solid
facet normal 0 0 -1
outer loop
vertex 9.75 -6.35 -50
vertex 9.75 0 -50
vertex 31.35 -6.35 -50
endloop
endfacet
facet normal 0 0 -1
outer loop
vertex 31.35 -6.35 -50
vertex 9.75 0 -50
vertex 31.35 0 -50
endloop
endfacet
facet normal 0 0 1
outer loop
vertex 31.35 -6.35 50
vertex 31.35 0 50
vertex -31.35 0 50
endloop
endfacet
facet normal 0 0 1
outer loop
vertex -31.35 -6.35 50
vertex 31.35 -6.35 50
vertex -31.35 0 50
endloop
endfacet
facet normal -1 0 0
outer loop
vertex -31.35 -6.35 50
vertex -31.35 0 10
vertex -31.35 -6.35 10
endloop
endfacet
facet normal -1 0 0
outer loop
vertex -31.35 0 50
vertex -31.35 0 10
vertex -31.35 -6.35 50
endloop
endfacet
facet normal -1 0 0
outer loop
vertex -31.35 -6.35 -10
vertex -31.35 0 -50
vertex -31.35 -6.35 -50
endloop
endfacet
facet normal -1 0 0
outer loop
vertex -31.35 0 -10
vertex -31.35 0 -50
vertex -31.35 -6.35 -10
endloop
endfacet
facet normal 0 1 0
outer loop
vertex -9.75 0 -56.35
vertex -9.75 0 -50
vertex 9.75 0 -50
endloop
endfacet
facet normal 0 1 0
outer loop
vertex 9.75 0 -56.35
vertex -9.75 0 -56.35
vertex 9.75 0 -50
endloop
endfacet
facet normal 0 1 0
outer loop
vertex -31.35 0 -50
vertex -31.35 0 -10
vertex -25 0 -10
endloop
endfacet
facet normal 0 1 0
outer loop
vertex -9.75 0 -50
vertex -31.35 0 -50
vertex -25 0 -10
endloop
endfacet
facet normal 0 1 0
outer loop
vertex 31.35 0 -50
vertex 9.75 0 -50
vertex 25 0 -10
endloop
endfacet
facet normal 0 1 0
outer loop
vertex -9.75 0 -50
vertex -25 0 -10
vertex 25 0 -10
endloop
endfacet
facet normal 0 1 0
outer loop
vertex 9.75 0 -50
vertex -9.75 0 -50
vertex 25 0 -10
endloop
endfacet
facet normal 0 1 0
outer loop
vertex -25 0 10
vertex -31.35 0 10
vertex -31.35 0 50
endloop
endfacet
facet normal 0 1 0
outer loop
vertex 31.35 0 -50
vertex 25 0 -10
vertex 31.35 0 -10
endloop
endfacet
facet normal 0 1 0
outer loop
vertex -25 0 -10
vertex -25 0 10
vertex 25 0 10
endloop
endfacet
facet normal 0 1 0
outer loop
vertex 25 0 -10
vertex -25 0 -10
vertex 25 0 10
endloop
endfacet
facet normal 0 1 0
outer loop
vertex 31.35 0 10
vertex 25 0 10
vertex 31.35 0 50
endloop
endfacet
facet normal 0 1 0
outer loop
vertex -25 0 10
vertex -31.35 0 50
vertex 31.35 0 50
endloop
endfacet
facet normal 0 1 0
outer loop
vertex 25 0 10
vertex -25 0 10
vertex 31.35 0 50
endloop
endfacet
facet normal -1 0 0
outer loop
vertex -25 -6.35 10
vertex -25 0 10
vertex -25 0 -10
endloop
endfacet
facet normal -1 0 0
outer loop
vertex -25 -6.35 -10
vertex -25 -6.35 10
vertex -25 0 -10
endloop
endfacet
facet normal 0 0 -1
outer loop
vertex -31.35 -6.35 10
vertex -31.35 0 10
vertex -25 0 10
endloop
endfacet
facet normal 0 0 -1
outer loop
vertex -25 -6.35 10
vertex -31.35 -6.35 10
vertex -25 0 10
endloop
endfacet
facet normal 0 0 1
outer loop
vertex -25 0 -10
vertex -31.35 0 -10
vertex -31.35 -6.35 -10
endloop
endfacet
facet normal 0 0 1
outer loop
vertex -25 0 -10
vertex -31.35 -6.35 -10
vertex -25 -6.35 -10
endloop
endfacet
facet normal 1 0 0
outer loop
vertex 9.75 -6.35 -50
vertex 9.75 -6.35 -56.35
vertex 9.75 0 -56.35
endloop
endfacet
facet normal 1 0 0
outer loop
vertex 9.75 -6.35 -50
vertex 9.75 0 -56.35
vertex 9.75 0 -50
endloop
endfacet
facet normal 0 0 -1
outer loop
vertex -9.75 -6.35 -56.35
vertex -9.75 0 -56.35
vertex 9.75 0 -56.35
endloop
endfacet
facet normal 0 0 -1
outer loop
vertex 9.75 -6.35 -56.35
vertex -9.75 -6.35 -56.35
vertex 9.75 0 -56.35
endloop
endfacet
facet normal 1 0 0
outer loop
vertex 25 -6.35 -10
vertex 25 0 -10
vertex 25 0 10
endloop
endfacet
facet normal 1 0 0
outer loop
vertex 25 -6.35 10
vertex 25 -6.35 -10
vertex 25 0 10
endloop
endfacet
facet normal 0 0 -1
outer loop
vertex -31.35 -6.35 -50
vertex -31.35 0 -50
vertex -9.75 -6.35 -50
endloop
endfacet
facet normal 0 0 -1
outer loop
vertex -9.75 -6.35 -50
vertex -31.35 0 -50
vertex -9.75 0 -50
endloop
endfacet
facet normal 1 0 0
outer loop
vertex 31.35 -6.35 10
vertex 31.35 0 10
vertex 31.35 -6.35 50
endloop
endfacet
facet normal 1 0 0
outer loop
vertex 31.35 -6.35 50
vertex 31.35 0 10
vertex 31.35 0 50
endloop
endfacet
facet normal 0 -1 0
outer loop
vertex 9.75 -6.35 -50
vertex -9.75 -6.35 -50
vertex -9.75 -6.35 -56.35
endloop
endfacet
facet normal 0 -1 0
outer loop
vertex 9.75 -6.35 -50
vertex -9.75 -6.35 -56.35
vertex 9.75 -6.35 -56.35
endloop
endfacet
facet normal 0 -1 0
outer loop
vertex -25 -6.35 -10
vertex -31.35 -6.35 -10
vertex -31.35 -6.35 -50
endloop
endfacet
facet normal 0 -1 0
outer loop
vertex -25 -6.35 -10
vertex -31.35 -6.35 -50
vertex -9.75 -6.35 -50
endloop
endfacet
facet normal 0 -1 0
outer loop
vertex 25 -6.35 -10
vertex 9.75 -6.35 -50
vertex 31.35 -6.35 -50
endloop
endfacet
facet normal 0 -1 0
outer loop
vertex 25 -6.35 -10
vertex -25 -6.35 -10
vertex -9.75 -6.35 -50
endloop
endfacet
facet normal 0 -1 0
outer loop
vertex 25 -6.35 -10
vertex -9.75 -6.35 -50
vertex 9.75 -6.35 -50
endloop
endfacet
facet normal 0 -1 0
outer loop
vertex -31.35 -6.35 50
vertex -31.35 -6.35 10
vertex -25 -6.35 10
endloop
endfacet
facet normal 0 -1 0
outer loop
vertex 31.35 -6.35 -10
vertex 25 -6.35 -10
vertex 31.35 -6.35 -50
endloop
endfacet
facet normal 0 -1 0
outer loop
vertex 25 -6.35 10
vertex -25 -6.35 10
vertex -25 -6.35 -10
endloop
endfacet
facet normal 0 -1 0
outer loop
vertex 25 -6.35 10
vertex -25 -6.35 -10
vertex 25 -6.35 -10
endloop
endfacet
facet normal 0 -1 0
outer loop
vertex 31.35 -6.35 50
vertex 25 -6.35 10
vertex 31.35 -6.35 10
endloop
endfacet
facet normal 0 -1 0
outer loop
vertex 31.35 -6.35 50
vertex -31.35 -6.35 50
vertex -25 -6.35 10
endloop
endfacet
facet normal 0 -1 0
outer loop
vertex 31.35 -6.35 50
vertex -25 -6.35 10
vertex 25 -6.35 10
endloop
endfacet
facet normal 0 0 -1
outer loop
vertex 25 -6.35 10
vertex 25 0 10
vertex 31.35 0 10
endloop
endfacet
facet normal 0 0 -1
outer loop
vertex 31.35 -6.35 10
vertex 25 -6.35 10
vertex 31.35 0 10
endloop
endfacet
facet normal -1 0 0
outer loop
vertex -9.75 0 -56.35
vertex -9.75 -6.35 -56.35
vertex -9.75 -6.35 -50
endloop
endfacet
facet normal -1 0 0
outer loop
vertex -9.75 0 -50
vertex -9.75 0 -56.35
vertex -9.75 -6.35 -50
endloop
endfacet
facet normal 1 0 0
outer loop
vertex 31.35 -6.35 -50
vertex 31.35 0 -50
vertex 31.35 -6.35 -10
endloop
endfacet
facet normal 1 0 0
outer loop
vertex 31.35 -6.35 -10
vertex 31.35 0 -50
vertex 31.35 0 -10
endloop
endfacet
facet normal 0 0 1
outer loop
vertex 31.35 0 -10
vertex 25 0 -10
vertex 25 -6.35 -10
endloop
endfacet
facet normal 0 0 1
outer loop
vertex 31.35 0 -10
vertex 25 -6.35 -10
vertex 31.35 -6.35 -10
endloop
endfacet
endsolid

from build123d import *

# Parameters (mm, degrees)
F0_W     = 6.35
F0_H     = 40
F0_W_2   = 19.5
F0_H_2   = 6.35
F1_DEPTH = 6.35


with BuildPart() as f1:
    # F0 (on Front) → F1 (new body)
    with BuildSketch(Plane.XZ):
        Polygon((25, 10), (25, 50), (-25, 50), (-25, 10), (-25, -10), (-25, -50), (-9.75, -50), (9.75, -50), (25, -50), (25, -10), align=None)
        with Locations((28.175, 30)):
            Rectangle(F0_W, F0_H)
        with Locations((-28.175, 30)):
            Rectangle(F0_W, F0_H)
        with Locations((28.175, -30)):
            Rectangle(F0_W, F0_H)
        with Locations((-28.175, -30)):
            Rectangle(F0_W, F0_H)
        with Locations((0, -53.175)):
            Rectangle(F0_W_2, F0_H_2)
    extrude(amount=F1_DEPTH)


solid = f1.part
